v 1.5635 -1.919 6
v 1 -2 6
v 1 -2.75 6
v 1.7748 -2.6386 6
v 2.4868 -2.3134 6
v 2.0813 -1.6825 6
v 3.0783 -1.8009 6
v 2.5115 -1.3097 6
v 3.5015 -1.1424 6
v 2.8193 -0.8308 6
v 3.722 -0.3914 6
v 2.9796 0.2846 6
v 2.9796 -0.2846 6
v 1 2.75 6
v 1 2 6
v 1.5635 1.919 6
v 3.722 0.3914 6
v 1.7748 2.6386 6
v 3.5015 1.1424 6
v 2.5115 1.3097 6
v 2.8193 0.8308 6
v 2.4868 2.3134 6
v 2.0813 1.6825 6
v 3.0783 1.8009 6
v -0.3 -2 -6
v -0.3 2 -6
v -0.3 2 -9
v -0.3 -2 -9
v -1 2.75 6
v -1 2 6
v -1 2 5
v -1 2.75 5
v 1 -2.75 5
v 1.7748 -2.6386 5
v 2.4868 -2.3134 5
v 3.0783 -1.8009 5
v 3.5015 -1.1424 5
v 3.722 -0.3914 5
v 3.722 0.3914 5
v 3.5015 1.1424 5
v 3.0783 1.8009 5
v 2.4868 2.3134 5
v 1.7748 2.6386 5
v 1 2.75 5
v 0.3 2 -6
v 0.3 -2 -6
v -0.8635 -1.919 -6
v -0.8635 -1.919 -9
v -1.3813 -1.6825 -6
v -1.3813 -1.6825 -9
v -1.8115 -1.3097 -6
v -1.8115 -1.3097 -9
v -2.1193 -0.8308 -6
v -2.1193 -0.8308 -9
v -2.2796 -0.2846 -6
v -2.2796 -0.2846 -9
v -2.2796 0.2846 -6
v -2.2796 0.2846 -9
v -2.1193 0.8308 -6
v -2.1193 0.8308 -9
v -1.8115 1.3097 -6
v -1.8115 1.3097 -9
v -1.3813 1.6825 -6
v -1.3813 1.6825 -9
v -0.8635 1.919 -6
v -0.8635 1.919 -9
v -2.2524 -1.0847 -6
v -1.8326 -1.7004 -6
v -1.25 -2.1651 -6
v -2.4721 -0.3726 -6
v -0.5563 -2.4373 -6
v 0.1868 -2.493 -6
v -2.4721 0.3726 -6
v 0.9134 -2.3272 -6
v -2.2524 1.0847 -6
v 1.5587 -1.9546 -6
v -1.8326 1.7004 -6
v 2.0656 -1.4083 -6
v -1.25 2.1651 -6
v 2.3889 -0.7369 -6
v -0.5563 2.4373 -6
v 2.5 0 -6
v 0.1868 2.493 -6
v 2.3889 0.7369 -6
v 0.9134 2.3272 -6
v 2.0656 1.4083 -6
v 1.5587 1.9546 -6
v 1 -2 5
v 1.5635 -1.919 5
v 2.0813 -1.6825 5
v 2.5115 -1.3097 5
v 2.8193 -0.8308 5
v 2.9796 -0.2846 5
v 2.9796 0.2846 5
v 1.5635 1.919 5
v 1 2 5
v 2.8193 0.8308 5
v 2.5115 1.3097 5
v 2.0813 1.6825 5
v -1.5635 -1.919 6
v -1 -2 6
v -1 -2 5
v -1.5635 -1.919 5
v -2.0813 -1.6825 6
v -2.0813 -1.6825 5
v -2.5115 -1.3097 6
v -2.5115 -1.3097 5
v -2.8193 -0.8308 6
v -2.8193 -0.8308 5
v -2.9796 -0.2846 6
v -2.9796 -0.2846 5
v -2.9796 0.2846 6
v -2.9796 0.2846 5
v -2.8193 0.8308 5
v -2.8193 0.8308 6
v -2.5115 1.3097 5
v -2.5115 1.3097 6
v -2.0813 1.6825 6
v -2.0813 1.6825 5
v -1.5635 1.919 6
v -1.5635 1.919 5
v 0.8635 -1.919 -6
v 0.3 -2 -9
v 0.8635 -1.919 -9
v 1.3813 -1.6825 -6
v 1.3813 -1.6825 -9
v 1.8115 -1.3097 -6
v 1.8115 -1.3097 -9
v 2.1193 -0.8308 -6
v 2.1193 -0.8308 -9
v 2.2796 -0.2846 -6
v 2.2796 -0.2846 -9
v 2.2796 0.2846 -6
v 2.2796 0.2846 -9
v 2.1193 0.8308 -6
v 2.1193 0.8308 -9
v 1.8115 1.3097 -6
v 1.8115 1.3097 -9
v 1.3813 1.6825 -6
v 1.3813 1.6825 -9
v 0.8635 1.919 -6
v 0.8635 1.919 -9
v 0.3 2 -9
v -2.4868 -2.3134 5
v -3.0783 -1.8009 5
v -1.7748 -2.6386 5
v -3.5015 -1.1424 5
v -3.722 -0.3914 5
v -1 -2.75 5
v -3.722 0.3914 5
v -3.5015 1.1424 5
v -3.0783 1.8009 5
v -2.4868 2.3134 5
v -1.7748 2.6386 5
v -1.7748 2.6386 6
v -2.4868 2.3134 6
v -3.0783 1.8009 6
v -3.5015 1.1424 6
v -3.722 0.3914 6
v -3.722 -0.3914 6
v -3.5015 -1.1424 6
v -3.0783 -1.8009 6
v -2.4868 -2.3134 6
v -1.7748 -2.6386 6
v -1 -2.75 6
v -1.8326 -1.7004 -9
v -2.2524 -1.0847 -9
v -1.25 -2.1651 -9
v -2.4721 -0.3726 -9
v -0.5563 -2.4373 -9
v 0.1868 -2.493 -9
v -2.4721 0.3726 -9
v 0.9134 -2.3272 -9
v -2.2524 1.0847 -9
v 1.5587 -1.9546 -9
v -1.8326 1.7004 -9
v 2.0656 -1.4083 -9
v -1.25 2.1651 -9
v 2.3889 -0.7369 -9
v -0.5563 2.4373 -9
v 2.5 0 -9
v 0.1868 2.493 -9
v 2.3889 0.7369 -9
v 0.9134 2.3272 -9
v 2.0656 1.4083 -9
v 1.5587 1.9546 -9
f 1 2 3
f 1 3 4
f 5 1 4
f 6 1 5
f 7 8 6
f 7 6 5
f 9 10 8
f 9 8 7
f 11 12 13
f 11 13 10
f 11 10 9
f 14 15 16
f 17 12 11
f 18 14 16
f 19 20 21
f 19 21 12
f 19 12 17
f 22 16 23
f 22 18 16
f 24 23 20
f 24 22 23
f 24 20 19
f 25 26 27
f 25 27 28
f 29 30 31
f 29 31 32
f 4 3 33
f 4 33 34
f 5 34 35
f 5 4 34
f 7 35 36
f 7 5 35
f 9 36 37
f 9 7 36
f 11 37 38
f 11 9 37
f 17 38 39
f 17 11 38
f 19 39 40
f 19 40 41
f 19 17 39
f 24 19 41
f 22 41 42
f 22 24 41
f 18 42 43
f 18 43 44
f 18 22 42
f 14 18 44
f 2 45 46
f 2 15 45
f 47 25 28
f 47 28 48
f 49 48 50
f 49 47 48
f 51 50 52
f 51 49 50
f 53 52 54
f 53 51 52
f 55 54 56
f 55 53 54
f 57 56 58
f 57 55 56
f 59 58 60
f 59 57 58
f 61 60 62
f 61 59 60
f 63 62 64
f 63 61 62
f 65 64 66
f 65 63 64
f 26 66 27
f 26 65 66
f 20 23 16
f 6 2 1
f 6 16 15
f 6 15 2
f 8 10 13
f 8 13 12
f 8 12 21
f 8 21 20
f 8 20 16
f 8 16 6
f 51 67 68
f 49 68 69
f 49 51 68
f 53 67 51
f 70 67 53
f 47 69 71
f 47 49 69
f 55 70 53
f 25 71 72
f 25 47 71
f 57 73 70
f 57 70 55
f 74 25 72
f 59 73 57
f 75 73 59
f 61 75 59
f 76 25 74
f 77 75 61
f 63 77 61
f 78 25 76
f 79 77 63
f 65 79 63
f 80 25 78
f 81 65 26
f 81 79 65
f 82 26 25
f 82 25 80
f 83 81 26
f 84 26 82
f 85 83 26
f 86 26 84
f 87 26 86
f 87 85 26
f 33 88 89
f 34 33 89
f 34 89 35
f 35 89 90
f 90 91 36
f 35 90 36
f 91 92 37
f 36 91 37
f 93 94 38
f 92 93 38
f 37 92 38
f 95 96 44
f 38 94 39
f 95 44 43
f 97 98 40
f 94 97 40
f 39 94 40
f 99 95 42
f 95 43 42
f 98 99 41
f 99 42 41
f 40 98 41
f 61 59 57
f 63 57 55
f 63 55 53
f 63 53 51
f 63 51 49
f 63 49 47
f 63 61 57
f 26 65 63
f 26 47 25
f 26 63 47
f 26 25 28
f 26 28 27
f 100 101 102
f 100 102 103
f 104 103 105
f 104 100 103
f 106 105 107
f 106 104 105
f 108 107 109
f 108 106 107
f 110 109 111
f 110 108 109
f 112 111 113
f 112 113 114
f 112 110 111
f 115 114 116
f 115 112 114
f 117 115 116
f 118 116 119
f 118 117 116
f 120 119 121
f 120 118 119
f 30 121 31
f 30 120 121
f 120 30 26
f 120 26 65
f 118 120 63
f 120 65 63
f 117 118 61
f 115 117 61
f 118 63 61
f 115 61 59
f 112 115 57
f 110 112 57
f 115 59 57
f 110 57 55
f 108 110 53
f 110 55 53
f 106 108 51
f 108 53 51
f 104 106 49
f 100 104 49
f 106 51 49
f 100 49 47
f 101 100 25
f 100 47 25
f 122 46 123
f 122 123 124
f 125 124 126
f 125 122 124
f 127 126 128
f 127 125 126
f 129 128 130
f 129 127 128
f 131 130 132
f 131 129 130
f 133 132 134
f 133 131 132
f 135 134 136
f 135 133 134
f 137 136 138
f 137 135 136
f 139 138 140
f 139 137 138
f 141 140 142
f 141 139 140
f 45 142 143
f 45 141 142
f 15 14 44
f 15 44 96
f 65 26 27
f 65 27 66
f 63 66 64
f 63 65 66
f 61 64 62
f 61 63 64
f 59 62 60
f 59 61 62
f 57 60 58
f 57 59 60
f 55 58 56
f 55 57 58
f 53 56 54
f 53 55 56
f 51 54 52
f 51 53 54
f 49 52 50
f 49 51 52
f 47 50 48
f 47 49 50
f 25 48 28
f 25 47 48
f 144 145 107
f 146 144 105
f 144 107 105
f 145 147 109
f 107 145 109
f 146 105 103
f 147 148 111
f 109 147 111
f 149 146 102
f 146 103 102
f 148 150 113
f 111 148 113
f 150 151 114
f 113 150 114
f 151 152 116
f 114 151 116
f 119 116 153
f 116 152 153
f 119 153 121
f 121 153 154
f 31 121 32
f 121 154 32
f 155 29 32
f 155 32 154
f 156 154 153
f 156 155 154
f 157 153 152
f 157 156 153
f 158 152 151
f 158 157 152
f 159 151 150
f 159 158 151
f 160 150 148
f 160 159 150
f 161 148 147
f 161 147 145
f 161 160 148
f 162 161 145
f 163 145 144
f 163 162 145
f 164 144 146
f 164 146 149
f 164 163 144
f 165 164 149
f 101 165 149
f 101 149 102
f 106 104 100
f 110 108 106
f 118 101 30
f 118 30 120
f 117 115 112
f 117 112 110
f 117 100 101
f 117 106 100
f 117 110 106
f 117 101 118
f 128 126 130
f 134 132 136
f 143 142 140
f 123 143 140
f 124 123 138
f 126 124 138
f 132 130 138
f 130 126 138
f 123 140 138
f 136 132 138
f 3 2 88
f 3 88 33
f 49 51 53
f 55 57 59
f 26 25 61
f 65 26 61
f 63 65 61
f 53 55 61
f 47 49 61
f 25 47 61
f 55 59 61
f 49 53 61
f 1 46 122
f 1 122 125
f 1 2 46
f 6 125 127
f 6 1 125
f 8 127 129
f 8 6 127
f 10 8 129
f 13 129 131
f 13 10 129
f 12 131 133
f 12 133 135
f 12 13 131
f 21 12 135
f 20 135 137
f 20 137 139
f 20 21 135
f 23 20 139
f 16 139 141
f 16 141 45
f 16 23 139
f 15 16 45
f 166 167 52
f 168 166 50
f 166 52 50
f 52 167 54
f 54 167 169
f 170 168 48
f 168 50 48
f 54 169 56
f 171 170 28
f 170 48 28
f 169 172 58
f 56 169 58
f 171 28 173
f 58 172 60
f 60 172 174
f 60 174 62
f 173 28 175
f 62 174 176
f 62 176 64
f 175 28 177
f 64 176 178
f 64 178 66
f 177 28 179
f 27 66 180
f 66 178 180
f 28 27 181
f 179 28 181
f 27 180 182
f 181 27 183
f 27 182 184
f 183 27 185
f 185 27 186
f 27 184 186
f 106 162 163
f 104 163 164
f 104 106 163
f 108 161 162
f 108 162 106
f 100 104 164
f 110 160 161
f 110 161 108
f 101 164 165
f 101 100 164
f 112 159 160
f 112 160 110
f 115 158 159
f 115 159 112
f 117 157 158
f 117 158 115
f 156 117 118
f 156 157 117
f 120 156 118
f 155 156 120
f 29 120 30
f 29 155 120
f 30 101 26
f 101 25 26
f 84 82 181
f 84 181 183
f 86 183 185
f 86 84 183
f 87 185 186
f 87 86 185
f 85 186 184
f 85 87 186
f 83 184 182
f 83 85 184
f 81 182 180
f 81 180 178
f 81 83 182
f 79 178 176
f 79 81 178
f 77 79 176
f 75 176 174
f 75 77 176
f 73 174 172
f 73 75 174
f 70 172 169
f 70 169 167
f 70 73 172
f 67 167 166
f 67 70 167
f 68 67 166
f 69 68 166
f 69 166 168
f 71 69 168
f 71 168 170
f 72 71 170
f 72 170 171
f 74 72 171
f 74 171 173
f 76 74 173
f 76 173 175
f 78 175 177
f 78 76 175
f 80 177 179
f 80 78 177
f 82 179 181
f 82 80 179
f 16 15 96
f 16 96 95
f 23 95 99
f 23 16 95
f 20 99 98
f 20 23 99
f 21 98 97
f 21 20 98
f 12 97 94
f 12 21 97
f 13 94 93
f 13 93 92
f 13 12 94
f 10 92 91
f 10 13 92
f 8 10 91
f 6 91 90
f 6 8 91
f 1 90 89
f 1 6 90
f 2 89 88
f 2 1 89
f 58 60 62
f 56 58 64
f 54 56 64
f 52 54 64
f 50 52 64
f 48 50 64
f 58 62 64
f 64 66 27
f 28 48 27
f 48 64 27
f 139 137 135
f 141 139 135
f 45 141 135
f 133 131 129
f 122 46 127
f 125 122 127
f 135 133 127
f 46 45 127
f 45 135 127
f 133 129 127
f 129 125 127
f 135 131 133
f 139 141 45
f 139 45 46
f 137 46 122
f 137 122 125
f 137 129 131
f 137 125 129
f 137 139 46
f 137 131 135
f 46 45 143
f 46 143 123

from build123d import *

# Parameters (mm, degrees)
F6_R     = 2.5
F7_DEPTH = 3
F8_DEPTH = 1


with BuildPart() as f4:
    # F2 (on offset) → F4 section 0
    with BuildSketch(Plane.XY.offset(-6)):
        with BuildLine():
            ThreePointArc((0.3, -2), (2.3, 0), (0.3, 2))
            Line((0.3, 2), (0.3, -2))
        make_face()
    # F3 (on offset) → F4 section 1
    with BuildSketch(Plane.XY.offset(6)):
        with BuildLine():
            ThreePointArc((1, -2), (3, 0), (1, 2))
            Line((1, 2), (1, -2))
        make_face()
    loft()


with BuildPart() as f5:
    # F3 (on offset) → F5 section 0
    with BuildSketch(Plane.XY.offset(6)):
        with BuildLine():
            Line((-1, -2), (-1, 2))
            ThreePointArc((-1, 2), (-3, 0), (-1, -2))
        make_face()
    # F2 (on offset) → F5 section 1
    with BuildSketch(Plane.XY.offset(-6)):
        with BuildLine():
            Line((-0.3, -2), (-0.3, 2))
            ThreePointArc((-0.3, 2), (-2.3, 0), (-0.3, -2))
        make_face()
    loft()


with BuildPart() as f7:
    # F6 (on face) → F7 (new body)
    with BuildSketch(Plane.XY.offset(-6)):
        Circle(F6_R)
        with BuildLine():
            Line((-0.3, 2), (-0.3, -2))
            ThreePointArc((-0.3, -2), (-2.3, 0), (-0.3, 2))
        make_face(mode=Mode.SUBTRACT)
    extrude(amount=-F7_DEPTH)


with BuildPart() as f7b:
    # F2 (on offset) → F7, piece 2 (new body)
    with BuildSketch(Plane.XY.offset(-6)):
        with BuildLine():
            Line((-0.3, -2), (-0.3, 2))
            ThreePointArc((-0.3, 2), (-2.3, 0), (-0.3, -2))
        make_face()
    extrude(amount=-F7_DEPTH)


with BuildPart() as f7c:
    # F2 (on offset) → F7, piece 3 (new body)
    with BuildSketch(Plane.XY.offset(-6)):
        with BuildLine():
            ThreePointArc((0.3, -2), (2.3, 0), (0.3, 2))
            Line((0.3, 2), (0.3, -2))
        make_face()
    extrude(amount=-F7_DEPTH)


with BuildPart() as f8:
    # F3 (on offset) → F8 (new body)
    with BuildSketch(Plane.XY.offset(6)):
        with BuildLine():
            ThreePointArc((-1, -2), (-3, 0), (-1, 2))
            Line((-1, 2), (-1, 2.75))
            ThreePointArc((-1, 2.75), (-3.75, 0), (-1, -2.75))
            Line((-1, -2.75), (-1, -2))
        make_face()
    extrude(amount=-F8_DEPTH)


with BuildPart() as f8b:
    # F3 (on offset) → F8, piece 2 (new body)
    with BuildSketch(Plane.XY.offset(6)):
        with BuildLine():
            Line((1, 2.75), (1, 2))
            ThreePointArc((1, 2), (3, 0), (1, -2))
            Line((1, -2), (1, -2.75))
            ThreePointArc((1, -2.75), (3.75, 0), (1, 2.75))
        make_face()
    extrude(amount=-F8_DEPTH)


solid = Compound([f4.part, f5.part, f7.part, f7b.part, f7c.part, f8.part, f8b.part])
